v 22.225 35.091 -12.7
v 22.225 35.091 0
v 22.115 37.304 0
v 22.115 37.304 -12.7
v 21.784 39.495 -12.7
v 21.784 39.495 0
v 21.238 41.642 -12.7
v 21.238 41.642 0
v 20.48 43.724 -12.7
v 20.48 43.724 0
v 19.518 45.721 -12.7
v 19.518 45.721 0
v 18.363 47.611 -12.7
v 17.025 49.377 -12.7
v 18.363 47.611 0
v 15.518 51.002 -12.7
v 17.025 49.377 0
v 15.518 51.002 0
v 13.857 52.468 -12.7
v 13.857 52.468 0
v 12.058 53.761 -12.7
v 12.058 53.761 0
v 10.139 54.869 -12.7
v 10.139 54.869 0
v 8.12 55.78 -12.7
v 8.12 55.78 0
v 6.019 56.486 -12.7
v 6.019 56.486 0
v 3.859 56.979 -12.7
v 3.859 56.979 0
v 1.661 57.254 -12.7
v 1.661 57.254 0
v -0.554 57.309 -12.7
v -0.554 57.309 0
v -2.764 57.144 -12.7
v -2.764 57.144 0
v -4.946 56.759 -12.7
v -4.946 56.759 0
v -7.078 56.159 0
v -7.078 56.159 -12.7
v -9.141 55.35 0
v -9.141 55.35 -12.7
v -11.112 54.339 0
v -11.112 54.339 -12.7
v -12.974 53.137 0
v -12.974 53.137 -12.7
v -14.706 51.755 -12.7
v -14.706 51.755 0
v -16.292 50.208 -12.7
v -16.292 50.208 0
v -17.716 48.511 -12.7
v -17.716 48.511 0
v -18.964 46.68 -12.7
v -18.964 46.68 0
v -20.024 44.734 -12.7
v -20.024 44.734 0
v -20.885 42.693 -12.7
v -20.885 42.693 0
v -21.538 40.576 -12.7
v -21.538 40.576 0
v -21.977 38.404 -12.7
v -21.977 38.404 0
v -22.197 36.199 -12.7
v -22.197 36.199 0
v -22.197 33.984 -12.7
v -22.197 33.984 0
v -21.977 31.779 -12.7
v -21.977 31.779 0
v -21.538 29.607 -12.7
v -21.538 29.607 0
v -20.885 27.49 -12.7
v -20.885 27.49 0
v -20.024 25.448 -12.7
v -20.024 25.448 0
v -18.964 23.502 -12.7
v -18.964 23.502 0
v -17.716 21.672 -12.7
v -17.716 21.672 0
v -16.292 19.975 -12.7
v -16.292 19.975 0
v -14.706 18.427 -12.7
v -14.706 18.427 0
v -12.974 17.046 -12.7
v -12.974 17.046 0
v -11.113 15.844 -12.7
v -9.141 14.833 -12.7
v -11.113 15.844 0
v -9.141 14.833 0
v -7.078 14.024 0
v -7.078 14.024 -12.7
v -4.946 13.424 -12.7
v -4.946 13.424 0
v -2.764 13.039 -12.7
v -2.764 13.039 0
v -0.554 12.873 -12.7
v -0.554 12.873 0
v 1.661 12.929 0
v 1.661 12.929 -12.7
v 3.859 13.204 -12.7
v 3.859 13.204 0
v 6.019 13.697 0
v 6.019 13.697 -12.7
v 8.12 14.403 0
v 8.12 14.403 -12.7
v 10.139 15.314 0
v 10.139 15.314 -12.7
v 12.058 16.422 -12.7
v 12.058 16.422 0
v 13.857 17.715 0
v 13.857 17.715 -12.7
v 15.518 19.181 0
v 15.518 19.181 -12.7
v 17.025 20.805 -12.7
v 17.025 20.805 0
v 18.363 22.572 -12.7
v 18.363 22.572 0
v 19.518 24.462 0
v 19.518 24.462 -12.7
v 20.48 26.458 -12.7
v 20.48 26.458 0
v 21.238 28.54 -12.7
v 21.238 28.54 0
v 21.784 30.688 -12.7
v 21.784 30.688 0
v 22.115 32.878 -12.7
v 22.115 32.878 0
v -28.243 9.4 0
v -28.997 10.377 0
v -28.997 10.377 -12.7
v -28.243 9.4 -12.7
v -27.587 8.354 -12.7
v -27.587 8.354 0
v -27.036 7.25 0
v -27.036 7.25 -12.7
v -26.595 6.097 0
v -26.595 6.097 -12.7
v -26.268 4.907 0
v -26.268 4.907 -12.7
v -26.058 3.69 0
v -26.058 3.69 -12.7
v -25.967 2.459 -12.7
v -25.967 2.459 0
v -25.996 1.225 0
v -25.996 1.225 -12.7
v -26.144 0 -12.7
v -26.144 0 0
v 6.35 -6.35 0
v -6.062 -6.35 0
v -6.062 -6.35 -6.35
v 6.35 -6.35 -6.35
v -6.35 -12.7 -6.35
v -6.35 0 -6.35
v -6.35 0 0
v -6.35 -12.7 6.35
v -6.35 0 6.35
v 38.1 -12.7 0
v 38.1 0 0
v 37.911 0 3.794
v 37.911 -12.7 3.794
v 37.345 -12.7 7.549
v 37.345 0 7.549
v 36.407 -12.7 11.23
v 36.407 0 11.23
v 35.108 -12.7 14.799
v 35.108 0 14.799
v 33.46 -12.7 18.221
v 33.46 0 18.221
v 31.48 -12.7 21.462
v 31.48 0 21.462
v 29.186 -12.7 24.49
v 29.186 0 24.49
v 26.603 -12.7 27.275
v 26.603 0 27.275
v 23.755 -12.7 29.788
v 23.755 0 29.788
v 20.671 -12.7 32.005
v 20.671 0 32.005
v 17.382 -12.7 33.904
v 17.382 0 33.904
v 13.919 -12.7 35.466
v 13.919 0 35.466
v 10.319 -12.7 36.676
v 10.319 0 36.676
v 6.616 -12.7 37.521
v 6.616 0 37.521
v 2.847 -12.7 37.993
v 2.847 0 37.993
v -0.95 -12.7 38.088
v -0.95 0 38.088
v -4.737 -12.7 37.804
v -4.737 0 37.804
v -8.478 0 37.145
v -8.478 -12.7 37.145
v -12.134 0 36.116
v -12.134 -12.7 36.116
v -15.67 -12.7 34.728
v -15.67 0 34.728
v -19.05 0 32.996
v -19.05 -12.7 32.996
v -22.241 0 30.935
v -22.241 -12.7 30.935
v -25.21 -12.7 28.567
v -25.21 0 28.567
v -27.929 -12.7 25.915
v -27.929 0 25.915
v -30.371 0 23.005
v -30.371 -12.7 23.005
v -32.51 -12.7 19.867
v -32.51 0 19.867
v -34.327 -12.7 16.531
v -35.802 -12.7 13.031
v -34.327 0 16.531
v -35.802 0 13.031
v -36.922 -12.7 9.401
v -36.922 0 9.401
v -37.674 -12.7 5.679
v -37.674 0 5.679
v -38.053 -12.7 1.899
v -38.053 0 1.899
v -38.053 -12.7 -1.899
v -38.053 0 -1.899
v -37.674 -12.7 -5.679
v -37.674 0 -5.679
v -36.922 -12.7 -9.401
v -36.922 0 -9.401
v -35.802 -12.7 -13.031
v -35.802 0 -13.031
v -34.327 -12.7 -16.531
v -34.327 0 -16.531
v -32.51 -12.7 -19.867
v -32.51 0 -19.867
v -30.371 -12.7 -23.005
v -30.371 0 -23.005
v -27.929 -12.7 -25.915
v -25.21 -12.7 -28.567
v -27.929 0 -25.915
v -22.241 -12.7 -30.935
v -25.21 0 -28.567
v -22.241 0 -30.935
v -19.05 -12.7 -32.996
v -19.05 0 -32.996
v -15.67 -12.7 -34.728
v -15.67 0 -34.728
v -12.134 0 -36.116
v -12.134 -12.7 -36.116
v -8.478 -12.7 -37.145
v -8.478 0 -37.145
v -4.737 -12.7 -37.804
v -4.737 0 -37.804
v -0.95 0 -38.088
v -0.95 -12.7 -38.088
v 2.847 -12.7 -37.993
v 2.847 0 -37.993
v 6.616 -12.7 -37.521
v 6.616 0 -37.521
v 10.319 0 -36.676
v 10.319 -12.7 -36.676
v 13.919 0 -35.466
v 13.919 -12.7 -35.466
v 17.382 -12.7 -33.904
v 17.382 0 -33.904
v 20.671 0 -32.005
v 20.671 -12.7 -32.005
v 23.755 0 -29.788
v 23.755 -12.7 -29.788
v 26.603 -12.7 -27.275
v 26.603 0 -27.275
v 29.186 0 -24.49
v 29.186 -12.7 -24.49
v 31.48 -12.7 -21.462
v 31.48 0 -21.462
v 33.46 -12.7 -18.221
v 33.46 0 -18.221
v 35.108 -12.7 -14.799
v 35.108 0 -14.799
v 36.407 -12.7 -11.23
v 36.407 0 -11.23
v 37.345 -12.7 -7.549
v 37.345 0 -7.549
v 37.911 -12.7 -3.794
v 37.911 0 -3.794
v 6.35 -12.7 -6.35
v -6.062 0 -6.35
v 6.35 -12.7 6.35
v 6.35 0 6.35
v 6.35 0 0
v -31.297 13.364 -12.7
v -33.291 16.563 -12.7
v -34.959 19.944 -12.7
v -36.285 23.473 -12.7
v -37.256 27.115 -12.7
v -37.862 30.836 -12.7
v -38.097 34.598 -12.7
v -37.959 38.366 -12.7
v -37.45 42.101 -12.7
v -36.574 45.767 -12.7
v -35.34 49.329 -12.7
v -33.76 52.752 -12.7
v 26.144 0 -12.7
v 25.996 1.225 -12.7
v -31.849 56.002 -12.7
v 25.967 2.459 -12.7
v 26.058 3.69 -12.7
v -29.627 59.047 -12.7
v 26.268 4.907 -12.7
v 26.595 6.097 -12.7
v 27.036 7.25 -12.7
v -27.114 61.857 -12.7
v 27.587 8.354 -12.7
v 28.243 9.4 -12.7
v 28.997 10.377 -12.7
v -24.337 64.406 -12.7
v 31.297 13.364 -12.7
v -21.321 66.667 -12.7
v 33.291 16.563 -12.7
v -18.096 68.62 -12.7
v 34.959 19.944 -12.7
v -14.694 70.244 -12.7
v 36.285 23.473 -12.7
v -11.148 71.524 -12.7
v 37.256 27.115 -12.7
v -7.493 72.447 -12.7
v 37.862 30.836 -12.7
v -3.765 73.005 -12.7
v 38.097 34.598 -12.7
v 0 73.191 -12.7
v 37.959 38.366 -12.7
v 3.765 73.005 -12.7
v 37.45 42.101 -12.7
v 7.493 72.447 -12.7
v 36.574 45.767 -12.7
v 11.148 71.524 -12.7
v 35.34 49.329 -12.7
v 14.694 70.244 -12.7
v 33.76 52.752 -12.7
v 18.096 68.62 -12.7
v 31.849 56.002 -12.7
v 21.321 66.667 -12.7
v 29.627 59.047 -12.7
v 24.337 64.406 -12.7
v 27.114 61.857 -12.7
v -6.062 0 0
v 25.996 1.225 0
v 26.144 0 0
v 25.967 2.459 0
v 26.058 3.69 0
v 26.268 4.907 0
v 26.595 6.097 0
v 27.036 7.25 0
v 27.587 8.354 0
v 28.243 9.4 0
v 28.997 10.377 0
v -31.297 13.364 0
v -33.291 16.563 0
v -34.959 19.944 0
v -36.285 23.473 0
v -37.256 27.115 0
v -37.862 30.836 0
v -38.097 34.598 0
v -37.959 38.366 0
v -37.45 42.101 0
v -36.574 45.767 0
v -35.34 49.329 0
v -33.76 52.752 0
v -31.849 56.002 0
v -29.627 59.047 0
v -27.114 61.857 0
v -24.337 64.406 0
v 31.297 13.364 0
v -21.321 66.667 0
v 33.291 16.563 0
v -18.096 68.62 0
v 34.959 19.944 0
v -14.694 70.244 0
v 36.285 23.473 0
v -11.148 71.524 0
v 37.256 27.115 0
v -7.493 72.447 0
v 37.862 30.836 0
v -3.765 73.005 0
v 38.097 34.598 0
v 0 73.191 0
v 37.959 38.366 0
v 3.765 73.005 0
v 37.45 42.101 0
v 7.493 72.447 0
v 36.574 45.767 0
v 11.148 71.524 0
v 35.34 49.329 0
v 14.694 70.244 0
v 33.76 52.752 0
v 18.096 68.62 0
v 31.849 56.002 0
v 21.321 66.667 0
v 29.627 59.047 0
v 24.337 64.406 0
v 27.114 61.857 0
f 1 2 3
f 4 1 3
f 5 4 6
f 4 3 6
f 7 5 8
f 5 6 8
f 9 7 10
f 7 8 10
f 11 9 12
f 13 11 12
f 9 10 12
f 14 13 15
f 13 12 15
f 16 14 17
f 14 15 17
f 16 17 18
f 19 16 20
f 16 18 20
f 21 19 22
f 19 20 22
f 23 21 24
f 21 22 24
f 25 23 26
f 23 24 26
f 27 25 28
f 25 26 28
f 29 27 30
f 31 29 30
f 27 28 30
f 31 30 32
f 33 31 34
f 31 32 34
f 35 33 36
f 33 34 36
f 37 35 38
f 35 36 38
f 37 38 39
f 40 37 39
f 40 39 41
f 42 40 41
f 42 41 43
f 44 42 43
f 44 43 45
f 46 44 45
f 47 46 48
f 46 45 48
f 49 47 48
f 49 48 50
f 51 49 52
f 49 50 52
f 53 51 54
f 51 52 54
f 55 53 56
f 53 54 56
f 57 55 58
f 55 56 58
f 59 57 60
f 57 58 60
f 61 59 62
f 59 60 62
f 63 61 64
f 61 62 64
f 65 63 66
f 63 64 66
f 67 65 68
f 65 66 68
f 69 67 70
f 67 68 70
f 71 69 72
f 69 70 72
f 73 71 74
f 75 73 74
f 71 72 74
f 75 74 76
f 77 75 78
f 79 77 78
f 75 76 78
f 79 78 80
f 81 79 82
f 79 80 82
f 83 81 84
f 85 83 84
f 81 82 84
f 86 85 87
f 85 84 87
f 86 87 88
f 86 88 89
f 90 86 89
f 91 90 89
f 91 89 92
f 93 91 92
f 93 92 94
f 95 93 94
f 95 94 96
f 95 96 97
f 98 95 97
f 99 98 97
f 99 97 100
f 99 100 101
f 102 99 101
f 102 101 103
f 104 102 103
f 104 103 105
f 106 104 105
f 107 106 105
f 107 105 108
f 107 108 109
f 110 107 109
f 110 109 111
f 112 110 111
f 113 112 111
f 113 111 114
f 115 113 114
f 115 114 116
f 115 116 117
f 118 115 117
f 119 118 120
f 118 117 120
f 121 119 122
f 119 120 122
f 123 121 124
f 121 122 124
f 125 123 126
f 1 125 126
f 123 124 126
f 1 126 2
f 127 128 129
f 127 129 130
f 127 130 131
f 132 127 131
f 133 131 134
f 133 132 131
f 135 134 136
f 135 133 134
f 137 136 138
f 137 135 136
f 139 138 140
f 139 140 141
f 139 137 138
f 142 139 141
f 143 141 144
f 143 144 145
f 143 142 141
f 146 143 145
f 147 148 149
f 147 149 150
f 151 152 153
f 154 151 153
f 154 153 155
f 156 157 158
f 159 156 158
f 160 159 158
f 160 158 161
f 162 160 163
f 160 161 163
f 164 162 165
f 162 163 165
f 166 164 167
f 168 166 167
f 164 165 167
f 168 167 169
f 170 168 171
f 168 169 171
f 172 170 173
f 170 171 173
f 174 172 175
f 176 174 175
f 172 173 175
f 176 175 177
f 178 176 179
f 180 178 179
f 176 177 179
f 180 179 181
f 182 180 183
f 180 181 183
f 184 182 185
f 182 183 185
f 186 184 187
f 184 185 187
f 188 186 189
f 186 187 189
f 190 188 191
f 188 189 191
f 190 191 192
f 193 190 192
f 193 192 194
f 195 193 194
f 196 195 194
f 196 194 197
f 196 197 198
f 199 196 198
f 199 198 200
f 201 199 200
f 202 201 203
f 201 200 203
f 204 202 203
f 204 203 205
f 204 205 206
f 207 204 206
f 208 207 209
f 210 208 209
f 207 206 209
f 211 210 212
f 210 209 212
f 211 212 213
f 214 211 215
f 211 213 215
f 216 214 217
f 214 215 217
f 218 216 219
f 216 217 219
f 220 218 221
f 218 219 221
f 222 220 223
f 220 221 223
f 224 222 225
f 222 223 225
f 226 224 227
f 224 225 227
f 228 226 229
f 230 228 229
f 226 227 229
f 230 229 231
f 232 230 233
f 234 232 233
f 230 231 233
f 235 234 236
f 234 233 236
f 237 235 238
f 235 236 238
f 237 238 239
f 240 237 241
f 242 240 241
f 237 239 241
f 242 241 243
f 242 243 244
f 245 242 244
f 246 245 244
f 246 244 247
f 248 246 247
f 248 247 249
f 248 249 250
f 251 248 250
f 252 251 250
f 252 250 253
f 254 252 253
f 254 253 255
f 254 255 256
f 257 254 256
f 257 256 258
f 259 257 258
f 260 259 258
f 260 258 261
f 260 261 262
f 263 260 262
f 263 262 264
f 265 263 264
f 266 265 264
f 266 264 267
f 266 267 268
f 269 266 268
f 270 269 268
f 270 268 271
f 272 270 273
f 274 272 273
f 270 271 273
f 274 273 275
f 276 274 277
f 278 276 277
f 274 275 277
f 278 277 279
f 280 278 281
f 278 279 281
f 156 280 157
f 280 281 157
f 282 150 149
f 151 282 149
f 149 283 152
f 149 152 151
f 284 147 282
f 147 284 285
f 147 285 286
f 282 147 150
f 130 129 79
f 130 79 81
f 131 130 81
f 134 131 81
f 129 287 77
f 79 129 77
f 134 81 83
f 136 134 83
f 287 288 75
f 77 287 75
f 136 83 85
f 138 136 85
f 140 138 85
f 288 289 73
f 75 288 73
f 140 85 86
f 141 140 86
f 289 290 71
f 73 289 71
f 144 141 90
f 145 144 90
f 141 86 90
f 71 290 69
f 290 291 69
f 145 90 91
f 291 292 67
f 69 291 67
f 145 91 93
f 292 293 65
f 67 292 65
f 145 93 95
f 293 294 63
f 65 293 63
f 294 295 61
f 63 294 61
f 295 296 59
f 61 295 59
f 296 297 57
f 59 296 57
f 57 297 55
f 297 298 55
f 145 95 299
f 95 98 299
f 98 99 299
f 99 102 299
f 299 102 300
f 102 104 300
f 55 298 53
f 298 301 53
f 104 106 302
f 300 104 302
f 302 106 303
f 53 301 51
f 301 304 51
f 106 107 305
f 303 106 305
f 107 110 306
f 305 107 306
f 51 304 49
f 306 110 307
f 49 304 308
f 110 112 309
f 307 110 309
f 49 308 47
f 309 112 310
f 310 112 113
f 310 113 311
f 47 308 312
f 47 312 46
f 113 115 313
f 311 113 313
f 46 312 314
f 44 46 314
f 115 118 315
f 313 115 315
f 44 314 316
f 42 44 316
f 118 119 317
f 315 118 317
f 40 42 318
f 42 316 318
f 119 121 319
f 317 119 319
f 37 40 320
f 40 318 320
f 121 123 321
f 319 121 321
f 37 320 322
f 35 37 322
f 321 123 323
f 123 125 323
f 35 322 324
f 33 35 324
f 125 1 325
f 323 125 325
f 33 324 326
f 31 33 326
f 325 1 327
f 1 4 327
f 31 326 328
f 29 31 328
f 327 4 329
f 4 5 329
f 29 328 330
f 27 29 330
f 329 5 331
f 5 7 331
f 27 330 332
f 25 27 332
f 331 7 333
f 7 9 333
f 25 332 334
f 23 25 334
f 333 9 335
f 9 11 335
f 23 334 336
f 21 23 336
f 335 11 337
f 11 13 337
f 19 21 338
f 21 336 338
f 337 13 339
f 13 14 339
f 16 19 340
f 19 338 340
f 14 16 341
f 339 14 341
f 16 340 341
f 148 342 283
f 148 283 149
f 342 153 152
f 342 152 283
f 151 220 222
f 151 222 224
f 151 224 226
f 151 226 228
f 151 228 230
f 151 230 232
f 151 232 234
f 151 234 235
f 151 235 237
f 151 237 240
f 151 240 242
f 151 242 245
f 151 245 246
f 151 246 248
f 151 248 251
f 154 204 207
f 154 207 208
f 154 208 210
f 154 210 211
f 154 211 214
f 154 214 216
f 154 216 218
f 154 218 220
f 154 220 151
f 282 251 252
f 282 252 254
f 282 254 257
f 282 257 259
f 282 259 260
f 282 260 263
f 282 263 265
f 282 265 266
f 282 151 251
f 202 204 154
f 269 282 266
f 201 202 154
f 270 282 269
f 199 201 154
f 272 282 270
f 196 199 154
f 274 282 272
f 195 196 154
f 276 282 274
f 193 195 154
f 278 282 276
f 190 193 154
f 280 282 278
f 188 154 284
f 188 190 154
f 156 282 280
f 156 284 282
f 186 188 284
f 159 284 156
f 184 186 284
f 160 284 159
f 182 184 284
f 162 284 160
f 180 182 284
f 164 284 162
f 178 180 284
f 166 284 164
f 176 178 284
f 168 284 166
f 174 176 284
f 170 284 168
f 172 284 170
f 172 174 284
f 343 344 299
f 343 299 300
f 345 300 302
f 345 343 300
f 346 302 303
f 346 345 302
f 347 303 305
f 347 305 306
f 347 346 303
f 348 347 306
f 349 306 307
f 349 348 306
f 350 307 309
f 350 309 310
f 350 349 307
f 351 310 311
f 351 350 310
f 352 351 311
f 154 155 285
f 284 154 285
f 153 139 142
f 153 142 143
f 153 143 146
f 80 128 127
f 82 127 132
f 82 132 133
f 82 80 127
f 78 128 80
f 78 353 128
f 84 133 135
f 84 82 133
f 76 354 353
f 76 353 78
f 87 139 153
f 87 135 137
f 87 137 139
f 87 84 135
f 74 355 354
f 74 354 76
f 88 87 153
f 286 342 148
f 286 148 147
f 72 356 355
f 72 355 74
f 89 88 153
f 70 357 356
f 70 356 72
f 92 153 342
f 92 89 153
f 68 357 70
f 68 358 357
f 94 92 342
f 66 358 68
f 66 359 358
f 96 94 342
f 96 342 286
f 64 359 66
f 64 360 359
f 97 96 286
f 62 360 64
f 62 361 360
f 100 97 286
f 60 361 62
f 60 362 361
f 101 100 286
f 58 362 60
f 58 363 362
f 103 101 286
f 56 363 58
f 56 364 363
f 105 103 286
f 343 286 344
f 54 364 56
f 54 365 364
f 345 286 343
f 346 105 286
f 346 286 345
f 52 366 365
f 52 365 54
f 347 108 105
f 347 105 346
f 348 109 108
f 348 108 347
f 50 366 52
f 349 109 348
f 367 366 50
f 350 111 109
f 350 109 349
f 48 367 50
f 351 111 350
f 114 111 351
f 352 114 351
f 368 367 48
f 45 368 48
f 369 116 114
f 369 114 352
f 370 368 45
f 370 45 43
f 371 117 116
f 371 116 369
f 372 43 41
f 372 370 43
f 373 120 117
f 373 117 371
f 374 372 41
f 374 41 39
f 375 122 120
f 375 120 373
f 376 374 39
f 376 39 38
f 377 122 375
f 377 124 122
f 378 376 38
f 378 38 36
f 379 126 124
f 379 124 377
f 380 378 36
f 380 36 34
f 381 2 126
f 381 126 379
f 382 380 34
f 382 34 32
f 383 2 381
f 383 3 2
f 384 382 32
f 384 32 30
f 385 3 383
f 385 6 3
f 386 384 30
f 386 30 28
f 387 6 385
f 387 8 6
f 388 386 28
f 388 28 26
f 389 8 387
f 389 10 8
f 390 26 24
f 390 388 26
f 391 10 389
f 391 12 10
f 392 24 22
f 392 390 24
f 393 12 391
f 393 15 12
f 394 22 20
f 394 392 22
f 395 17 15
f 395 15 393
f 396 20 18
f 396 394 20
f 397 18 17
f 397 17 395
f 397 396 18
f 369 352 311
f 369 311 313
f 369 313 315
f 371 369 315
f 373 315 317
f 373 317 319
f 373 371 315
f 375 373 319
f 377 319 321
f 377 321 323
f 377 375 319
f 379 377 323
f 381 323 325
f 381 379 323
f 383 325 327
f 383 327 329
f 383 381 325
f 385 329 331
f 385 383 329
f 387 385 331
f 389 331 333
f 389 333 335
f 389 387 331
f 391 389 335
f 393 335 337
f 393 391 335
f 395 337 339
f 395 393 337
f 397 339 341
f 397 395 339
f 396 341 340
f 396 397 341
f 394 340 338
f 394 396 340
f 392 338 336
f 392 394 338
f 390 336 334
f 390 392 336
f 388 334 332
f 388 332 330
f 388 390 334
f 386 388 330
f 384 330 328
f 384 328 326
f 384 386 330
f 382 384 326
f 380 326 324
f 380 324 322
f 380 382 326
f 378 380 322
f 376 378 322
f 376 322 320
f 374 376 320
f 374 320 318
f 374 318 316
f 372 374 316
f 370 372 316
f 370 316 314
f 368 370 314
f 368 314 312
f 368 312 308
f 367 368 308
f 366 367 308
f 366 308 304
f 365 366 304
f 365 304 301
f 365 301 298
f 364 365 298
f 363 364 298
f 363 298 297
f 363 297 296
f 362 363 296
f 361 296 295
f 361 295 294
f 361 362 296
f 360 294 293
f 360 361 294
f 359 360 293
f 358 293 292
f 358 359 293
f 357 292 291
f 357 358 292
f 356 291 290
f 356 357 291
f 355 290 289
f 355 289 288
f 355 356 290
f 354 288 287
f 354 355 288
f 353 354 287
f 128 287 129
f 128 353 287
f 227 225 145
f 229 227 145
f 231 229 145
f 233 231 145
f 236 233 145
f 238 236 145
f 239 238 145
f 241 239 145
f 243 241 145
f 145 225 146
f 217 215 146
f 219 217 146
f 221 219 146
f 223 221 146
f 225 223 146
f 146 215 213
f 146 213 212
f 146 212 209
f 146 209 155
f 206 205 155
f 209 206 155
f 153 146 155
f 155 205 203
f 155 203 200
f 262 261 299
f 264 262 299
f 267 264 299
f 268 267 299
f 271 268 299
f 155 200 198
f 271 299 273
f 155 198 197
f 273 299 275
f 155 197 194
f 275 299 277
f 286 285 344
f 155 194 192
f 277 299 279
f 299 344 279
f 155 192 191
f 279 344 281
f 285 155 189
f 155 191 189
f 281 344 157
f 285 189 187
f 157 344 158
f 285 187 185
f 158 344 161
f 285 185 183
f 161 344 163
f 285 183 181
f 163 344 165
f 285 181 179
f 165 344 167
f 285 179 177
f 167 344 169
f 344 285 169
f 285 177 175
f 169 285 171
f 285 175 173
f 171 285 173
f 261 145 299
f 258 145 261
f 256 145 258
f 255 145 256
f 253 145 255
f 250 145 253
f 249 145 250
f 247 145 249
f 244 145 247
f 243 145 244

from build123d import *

# Parameters (mm, degrees)
F0_R     = 38.1
F1_DEPTH = 12.7
F2_R     = 22.225
F3_DEPTH = 12.7


with BuildPart() as f1:
    # F0 (on Front) → F1 (new body)
    with BuildSketch(Plane.XZ):
        Circle(F0_R)
        Polygon((-6.35, 0), (-6.35, 6.35), (0, 6.35), (6.35, 6.35), (6.35, -6.35), (-6.35, -6.35), align=None, mode=Mode.SUBTRACT)
    extrude(amount=F1_DEPTH)

    # F2 (on Top) → F3 (join)
    with BuildSketch(Plane.XY):
        with BuildLine():
            ThreePointArc((26.144302, 0), (26.417088, 5.50585), (28.997098, 10.377435))
            ThreePointArc((28.997098, 10.377435), (0, 73.191364), (-28.997098, 10.377435))
            ThreePointArc((-28.997098, 10.377435), (-26.417088, 5.50585), (-26.144302, 0))
            Line((-26.144302, 0), (-6.061642, 0))
            Line((-6.061642, 0), (-6.061642, -6.35))
            Line((-6.061642, -6.35), (6.417282, -6.35))
            Line((6.417282, -6.35), (6.417282, 0))
            Line((6.417282, 0), (26.144302, 0))
        make_face()
        with Locations((0, 35.091364)):
            Circle(F2_R, mode=Mode.SUBTRACT)
    extrude(amount=-F3_DEPTH)


solid = f1.part
